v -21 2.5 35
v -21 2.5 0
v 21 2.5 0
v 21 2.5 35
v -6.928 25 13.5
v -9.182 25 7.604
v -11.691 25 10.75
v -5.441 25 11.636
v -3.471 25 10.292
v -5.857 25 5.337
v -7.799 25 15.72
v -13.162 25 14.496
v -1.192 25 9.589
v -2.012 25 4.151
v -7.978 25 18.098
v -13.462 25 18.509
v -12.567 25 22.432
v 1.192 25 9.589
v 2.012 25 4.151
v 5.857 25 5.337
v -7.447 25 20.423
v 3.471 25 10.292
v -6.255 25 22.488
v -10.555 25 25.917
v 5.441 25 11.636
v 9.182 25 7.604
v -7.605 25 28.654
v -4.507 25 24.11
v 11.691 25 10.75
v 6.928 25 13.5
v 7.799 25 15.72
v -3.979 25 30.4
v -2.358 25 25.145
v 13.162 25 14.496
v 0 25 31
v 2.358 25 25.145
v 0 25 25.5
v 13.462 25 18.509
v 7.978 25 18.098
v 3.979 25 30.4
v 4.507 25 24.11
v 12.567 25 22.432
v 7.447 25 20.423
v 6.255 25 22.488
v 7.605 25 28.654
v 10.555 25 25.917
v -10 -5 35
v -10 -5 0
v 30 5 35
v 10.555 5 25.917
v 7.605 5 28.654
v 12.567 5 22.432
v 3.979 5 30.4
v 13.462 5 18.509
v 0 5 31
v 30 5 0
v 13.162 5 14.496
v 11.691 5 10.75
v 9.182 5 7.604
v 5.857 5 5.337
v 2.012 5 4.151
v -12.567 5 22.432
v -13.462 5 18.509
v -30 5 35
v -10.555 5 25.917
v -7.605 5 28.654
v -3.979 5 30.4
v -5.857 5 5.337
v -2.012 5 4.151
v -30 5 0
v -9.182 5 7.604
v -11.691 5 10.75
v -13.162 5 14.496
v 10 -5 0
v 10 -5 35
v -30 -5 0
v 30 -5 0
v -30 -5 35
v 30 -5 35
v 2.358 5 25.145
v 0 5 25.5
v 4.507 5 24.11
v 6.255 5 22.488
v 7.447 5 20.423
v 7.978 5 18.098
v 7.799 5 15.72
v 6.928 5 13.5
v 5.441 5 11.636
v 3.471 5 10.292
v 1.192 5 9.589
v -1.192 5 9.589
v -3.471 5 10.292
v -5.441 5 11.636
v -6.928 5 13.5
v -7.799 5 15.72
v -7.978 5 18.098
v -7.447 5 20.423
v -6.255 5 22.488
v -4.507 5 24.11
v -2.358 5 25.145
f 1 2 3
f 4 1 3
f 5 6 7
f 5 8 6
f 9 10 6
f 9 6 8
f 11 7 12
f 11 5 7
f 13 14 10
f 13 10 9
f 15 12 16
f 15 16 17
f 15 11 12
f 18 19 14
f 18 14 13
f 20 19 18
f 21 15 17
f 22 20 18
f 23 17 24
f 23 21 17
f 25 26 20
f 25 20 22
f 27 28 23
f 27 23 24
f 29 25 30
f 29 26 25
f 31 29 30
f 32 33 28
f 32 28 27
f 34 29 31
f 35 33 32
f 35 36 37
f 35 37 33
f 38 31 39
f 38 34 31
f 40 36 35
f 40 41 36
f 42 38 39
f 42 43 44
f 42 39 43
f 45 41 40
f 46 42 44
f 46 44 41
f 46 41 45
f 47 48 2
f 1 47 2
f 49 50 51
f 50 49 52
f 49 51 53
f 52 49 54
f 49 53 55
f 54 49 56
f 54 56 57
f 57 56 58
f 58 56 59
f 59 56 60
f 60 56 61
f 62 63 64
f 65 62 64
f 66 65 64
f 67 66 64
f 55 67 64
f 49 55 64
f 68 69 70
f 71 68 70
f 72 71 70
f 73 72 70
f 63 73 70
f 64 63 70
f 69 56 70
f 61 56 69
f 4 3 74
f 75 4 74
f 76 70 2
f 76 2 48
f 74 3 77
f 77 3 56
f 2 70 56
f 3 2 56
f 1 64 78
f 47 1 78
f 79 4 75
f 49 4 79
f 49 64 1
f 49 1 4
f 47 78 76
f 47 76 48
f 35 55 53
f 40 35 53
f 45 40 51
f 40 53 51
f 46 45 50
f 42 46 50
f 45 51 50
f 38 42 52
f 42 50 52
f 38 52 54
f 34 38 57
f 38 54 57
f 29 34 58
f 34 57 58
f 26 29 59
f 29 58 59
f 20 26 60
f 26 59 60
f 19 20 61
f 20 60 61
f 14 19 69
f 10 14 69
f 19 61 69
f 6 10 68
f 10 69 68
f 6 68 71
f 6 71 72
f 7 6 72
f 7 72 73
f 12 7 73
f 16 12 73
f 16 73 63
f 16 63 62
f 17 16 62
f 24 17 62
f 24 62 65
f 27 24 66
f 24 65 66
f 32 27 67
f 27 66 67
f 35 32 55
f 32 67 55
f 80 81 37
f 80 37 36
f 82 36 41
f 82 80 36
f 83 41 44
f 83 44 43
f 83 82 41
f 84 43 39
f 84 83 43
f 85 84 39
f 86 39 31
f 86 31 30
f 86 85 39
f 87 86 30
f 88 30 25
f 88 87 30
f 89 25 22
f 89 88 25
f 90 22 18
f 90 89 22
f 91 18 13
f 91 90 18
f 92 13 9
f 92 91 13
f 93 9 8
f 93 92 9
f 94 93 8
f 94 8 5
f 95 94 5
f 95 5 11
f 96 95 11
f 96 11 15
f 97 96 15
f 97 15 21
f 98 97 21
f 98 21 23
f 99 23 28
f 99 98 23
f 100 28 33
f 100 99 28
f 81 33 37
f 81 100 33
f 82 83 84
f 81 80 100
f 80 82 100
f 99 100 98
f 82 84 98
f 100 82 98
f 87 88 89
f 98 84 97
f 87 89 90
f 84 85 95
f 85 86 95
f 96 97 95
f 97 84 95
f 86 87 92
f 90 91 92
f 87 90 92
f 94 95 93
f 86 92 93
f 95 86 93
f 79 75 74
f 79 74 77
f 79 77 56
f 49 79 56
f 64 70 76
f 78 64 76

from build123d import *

# Parameters (mm, degrees)
EXTRUDE_1_DEPTH = 35
SKETCH_2_R      = 13.5
SKETCH_2_R_2    = 8
EXTRUDE_2_DEPTH = 20


with BuildPart() as part:
    # Эскиз1 → Бобышка-Вытянуть1 (new body)
    with BuildSketch(Plane.XY):
        Polygon((-30, 5), (-30, -5), (-10, -5), (-21, 2.5), (0, 2.5), (21, 2.5), (10, -5), (30, -5), (30, 5), align=None)
    extrude(amount=EXTRUDE_1_DEPTH)

    # Эскиз2 → Бобышка-Вытянуть2 (add)
    with BuildSketch(Plane(origin=(0, 5, 0), x_dir=(1, 0, 0), z_dir=(0, 1, 0))):
        with Locations((0, -17.5)):
            Circle(SKETCH_2_R)
        with Locations((0, -17.5)):
            Circle(SKETCH_2_R_2, mode=Mode.SUBTRACT)
    extrude(amount=EXTRUDE_2_DEPTH)


solid = part.part
